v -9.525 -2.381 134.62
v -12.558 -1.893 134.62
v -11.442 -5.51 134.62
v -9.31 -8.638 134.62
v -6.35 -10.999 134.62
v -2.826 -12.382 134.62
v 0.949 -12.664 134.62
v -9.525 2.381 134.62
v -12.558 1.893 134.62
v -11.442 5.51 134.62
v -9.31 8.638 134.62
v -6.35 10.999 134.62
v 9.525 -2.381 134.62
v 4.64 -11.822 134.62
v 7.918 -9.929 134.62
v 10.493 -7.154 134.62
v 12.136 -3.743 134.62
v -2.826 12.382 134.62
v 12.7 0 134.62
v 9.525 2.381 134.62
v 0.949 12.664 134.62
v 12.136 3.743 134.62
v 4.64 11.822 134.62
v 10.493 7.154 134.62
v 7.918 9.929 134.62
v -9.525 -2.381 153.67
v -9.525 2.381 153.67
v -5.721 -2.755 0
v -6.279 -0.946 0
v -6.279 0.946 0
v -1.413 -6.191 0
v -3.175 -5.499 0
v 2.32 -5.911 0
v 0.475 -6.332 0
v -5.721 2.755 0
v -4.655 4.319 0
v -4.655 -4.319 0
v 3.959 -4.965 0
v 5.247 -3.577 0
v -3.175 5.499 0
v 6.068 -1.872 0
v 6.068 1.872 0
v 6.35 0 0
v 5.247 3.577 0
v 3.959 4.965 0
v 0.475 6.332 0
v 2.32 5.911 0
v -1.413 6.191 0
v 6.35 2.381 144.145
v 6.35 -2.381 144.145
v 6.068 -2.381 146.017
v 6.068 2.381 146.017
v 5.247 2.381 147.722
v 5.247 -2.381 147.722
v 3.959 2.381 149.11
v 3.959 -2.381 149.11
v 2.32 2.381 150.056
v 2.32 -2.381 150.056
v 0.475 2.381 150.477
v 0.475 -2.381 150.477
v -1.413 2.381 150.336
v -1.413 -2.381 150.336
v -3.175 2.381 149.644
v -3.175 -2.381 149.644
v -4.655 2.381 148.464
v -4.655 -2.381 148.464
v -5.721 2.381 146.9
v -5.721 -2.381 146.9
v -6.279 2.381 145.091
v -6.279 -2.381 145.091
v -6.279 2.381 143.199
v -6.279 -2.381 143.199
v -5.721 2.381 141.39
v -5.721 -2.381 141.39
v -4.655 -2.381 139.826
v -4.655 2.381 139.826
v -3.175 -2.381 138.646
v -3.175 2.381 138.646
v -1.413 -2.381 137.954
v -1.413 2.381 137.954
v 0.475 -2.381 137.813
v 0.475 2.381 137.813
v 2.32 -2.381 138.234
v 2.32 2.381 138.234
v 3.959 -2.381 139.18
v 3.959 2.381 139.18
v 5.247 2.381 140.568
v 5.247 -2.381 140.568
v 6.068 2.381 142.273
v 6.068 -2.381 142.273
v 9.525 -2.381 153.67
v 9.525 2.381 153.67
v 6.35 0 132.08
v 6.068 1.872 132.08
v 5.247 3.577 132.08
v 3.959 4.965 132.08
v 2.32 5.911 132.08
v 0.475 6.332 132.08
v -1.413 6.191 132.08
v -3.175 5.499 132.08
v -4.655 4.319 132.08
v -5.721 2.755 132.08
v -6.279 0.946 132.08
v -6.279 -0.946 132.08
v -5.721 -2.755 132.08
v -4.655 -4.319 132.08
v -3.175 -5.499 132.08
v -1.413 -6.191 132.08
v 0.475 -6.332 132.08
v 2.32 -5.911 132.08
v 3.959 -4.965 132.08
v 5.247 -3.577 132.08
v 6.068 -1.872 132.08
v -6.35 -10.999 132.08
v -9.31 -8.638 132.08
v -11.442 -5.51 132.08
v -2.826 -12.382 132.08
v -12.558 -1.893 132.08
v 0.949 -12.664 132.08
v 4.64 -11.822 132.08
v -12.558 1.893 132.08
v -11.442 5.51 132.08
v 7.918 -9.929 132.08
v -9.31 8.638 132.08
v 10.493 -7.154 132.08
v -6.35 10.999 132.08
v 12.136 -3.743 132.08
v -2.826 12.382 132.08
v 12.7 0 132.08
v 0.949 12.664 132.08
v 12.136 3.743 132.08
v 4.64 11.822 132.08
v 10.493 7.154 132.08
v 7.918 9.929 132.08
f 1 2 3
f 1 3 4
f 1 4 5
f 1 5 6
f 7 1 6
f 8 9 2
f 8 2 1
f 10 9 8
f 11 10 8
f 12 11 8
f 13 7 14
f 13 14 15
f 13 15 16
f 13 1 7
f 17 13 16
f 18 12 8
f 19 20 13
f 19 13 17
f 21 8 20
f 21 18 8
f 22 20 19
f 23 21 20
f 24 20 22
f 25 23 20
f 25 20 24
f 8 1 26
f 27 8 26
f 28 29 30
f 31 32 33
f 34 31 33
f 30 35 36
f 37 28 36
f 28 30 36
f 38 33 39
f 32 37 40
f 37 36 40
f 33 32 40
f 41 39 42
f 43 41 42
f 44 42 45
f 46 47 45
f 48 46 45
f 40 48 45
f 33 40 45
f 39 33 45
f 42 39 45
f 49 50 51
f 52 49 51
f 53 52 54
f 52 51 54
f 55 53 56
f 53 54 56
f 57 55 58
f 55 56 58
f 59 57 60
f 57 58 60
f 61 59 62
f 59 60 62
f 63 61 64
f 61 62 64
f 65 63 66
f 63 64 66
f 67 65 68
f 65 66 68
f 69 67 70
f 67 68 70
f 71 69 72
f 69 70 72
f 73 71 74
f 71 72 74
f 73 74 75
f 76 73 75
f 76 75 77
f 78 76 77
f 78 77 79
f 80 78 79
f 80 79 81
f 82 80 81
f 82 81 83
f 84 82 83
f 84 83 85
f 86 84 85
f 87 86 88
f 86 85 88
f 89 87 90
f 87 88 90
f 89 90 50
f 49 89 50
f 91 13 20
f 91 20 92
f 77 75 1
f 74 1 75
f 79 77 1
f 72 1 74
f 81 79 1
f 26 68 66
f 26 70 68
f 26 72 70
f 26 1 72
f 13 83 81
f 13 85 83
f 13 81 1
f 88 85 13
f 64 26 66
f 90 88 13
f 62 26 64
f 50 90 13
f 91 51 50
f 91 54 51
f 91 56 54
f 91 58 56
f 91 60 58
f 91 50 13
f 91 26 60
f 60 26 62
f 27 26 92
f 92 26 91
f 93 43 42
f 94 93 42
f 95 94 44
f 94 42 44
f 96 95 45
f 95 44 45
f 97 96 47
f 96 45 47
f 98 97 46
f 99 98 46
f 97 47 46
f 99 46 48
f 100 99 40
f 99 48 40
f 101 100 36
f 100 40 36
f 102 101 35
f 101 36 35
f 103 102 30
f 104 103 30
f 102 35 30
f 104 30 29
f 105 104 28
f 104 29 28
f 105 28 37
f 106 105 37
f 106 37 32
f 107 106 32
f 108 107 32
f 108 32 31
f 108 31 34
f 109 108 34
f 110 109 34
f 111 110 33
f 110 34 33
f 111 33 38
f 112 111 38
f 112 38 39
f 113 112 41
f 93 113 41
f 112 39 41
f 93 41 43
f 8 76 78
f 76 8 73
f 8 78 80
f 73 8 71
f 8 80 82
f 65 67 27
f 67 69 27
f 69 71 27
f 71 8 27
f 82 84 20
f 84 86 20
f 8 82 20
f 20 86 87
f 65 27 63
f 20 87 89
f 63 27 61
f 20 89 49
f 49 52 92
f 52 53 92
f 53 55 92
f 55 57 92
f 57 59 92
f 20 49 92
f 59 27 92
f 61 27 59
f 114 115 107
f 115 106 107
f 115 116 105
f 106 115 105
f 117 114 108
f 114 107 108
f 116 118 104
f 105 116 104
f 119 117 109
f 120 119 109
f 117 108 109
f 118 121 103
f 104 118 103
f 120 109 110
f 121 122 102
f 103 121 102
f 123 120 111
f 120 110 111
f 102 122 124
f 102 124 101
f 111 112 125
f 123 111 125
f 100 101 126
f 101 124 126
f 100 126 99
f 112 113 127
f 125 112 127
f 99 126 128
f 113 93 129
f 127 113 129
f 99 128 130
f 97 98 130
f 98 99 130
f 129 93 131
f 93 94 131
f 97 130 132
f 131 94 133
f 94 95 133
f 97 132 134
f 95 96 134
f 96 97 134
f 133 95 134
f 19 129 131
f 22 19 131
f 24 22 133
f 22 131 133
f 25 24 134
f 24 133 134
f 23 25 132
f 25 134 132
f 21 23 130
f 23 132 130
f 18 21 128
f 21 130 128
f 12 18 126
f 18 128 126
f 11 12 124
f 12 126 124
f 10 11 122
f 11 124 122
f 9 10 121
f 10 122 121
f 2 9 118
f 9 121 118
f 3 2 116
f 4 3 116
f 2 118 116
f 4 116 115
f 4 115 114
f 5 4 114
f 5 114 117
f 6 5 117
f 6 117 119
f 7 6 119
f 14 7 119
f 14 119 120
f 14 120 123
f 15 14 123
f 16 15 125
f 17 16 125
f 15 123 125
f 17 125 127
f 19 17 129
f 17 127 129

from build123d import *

# Parameters (mm, degrees)
F0_R     = 6.35
F1_DEPTH = 132.08
F2_R     = 12.7
F3_DEPTH = 2.54
F4_W     = 19.05
F4_H     = 19.05
F5_DEPTH = 2.38125
F6_R     = 6.35
F7_DEPTH = 4.7625


with BuildPart() as f1:
    # F0 (on Top) → F1 (new body)
    with BuildSketch(Plane.XY):
        Circle(F0_R)
    extrude(amount=F1_DEPTH)

    # F2 (on face) → F3 (join)
    with BuildSketch(Plane.XY.offset(132.08)):
        Circle(F2_R)
    extrude(amount=F3_DEPTH)

    # F4 (on Front) → F5 (join, symmetric)
    with BuildSketch(Plane.XZ):
        with Locations((0, 144.145)):
            Rectangle(F4_W, F4_H)
    extrude(amount=F5_DEPTH, both=True)

    # F6 (on face) → F7 (cut)
    with BuildSketch(Plane.XZ.offset(2.38125)):
        with Locations((0, 144.145)):
            Circle(F6_R)
    extrude(amount=-F7_DEPTH, mode=Mode.SUBTRACT)


solid = f1.part
